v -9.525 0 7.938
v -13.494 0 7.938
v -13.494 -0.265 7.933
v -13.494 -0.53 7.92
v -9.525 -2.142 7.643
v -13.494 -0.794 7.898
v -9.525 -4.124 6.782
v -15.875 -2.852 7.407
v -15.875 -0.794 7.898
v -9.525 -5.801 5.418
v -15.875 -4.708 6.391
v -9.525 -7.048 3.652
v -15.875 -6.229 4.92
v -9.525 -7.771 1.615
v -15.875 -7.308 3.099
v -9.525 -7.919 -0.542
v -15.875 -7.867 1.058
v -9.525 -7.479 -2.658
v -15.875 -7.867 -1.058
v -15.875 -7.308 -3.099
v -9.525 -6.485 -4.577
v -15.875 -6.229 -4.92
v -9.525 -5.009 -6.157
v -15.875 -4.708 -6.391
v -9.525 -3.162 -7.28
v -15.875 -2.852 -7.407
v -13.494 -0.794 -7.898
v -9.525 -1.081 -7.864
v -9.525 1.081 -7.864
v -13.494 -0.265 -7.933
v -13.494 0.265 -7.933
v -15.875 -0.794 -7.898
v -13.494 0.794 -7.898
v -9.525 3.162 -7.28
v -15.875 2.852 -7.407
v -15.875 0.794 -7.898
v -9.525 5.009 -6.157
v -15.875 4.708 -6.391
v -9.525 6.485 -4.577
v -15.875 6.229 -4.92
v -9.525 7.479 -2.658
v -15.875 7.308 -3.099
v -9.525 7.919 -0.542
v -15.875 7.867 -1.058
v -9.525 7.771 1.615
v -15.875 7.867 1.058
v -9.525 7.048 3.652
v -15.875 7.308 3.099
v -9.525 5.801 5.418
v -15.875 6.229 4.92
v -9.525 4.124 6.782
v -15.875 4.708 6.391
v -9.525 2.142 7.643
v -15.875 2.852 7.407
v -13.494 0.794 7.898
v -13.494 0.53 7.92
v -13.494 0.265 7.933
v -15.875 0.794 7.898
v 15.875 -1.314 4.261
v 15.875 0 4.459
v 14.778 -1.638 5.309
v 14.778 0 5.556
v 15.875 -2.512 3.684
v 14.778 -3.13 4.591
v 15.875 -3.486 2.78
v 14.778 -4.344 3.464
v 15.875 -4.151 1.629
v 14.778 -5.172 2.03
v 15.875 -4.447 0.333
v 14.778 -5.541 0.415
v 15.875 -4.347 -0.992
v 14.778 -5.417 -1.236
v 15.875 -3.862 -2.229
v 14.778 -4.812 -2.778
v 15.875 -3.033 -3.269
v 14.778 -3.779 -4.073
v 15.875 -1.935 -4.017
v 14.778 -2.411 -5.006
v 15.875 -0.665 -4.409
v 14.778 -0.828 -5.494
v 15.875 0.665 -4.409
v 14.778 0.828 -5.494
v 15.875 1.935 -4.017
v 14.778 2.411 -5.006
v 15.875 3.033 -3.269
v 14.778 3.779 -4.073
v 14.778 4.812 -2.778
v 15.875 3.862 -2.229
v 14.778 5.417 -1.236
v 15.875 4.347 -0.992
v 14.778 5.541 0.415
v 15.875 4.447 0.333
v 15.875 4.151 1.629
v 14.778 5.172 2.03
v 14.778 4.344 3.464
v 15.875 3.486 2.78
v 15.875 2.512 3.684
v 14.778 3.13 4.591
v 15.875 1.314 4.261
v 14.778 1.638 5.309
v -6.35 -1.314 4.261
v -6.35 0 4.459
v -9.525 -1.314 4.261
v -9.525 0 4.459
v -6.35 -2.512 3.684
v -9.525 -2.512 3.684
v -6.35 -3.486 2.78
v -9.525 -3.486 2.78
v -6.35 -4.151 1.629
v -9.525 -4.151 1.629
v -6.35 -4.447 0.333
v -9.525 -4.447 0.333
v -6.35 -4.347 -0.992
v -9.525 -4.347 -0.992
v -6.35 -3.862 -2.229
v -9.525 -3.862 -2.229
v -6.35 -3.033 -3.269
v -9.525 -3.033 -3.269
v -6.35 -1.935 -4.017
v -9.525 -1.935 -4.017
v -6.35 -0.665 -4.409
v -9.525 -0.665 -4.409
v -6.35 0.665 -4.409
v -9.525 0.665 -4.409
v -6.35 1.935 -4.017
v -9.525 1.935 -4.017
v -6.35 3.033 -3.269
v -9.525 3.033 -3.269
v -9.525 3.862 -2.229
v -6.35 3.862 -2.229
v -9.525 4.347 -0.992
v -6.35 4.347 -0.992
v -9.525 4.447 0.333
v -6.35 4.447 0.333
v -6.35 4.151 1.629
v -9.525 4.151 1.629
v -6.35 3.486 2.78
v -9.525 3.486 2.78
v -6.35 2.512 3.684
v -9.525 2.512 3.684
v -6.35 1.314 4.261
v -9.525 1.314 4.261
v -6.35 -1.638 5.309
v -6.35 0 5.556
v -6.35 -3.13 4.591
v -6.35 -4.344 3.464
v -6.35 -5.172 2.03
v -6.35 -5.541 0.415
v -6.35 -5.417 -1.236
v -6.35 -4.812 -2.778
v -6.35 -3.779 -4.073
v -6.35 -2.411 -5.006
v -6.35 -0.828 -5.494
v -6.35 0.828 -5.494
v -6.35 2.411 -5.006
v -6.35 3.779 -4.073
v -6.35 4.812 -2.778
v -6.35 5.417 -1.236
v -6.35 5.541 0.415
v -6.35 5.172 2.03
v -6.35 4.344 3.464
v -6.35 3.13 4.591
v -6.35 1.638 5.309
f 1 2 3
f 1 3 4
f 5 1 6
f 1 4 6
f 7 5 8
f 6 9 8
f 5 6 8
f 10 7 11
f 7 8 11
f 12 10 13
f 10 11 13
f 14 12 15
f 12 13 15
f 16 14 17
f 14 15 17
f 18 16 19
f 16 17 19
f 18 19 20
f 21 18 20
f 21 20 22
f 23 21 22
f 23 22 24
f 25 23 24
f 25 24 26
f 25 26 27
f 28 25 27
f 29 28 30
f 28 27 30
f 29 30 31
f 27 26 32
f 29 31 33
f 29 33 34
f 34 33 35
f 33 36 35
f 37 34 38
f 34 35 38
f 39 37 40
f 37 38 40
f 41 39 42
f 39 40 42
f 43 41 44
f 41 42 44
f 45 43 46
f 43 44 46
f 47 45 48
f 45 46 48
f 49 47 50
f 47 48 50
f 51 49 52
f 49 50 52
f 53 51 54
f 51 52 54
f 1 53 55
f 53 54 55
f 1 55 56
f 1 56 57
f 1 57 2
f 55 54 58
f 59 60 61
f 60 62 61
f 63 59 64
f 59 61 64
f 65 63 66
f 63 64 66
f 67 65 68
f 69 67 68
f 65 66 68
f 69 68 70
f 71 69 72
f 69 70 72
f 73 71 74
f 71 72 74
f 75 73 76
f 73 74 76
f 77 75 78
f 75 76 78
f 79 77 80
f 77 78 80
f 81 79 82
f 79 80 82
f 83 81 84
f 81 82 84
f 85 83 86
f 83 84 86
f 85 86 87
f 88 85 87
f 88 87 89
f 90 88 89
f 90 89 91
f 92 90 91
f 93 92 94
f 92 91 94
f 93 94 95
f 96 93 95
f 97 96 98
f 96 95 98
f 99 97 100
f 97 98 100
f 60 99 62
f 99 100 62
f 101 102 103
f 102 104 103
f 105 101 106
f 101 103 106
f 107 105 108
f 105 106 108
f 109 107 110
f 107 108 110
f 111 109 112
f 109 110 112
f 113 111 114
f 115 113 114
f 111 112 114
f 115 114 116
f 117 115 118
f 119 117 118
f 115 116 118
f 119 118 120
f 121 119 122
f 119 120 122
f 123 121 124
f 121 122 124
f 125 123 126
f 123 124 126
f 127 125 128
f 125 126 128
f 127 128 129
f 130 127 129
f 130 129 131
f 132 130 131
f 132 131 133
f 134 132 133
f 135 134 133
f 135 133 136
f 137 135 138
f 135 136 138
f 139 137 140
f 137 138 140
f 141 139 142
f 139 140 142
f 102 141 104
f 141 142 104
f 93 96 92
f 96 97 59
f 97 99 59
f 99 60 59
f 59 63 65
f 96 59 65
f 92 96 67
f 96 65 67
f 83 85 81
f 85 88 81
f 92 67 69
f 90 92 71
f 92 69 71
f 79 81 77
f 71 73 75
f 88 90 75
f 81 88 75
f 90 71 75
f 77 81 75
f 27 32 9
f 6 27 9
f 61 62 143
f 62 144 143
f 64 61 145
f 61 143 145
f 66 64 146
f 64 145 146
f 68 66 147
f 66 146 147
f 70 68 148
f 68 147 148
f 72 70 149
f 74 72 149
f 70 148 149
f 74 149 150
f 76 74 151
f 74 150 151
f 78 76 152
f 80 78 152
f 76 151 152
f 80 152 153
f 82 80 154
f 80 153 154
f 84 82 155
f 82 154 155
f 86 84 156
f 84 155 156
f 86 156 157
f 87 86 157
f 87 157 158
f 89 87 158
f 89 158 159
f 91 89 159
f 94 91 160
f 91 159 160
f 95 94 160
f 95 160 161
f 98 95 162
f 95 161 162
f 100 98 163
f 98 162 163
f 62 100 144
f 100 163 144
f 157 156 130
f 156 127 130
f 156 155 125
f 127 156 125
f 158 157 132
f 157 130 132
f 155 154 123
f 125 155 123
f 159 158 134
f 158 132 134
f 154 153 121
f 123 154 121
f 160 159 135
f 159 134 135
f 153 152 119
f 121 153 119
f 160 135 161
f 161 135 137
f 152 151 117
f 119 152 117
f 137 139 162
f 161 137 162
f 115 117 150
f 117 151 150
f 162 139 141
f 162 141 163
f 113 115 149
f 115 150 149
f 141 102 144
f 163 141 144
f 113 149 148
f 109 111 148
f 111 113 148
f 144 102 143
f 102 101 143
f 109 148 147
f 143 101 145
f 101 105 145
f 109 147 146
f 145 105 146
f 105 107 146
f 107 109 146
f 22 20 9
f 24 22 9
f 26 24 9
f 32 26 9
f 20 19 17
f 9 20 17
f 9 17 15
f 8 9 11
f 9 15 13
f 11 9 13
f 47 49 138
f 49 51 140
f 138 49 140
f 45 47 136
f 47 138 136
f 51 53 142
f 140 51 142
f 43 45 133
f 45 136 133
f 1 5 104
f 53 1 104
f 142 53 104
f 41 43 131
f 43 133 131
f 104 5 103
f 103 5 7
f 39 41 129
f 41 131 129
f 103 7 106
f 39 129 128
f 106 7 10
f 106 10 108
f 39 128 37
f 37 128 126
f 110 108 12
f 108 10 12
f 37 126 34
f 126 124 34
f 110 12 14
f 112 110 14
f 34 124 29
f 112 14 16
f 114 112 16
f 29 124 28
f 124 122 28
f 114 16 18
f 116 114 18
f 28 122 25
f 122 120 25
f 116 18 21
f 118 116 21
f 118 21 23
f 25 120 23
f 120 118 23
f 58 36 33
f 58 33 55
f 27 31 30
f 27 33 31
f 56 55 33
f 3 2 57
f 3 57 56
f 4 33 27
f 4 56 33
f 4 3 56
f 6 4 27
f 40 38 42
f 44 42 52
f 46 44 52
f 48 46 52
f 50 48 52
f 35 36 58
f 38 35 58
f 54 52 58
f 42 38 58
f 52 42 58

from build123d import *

# Parameters (mm, degrees)
F3_W     = 1.5875
F3_H     = 15.875
F2_DEPTH = 2.38125


with BuildPart() as f1:
    # F0 (on Front) → F1 (revolve)
    with BuildSketch(Plane.XZ):
        Polygon((-9.525, 7.9375), (-15.875, 7.9375), (-15.875, 0), (15.875, 0), (15.875, 4.45897), (14.77772, 5.55625), (-6.35, 5.55625), (-6.35, 4.45897), (-9.525, 4.45897), align=None)
    revolve(axis=Axis((0, 0, 0), (1, 0, 0)))

    # F3 (on face) → F2 (cut)
    with BuildSketch(Plane(origin=(-15.875, 0, 0), x_dir=(0, -1, 0), z_dir=(-1, 0, 0))):
        Rectangle(F3_W, F3_H)
    extrude(amount=-F2_DEPTH, mode=Mode.SUBTRACT)


solid = f1.part
